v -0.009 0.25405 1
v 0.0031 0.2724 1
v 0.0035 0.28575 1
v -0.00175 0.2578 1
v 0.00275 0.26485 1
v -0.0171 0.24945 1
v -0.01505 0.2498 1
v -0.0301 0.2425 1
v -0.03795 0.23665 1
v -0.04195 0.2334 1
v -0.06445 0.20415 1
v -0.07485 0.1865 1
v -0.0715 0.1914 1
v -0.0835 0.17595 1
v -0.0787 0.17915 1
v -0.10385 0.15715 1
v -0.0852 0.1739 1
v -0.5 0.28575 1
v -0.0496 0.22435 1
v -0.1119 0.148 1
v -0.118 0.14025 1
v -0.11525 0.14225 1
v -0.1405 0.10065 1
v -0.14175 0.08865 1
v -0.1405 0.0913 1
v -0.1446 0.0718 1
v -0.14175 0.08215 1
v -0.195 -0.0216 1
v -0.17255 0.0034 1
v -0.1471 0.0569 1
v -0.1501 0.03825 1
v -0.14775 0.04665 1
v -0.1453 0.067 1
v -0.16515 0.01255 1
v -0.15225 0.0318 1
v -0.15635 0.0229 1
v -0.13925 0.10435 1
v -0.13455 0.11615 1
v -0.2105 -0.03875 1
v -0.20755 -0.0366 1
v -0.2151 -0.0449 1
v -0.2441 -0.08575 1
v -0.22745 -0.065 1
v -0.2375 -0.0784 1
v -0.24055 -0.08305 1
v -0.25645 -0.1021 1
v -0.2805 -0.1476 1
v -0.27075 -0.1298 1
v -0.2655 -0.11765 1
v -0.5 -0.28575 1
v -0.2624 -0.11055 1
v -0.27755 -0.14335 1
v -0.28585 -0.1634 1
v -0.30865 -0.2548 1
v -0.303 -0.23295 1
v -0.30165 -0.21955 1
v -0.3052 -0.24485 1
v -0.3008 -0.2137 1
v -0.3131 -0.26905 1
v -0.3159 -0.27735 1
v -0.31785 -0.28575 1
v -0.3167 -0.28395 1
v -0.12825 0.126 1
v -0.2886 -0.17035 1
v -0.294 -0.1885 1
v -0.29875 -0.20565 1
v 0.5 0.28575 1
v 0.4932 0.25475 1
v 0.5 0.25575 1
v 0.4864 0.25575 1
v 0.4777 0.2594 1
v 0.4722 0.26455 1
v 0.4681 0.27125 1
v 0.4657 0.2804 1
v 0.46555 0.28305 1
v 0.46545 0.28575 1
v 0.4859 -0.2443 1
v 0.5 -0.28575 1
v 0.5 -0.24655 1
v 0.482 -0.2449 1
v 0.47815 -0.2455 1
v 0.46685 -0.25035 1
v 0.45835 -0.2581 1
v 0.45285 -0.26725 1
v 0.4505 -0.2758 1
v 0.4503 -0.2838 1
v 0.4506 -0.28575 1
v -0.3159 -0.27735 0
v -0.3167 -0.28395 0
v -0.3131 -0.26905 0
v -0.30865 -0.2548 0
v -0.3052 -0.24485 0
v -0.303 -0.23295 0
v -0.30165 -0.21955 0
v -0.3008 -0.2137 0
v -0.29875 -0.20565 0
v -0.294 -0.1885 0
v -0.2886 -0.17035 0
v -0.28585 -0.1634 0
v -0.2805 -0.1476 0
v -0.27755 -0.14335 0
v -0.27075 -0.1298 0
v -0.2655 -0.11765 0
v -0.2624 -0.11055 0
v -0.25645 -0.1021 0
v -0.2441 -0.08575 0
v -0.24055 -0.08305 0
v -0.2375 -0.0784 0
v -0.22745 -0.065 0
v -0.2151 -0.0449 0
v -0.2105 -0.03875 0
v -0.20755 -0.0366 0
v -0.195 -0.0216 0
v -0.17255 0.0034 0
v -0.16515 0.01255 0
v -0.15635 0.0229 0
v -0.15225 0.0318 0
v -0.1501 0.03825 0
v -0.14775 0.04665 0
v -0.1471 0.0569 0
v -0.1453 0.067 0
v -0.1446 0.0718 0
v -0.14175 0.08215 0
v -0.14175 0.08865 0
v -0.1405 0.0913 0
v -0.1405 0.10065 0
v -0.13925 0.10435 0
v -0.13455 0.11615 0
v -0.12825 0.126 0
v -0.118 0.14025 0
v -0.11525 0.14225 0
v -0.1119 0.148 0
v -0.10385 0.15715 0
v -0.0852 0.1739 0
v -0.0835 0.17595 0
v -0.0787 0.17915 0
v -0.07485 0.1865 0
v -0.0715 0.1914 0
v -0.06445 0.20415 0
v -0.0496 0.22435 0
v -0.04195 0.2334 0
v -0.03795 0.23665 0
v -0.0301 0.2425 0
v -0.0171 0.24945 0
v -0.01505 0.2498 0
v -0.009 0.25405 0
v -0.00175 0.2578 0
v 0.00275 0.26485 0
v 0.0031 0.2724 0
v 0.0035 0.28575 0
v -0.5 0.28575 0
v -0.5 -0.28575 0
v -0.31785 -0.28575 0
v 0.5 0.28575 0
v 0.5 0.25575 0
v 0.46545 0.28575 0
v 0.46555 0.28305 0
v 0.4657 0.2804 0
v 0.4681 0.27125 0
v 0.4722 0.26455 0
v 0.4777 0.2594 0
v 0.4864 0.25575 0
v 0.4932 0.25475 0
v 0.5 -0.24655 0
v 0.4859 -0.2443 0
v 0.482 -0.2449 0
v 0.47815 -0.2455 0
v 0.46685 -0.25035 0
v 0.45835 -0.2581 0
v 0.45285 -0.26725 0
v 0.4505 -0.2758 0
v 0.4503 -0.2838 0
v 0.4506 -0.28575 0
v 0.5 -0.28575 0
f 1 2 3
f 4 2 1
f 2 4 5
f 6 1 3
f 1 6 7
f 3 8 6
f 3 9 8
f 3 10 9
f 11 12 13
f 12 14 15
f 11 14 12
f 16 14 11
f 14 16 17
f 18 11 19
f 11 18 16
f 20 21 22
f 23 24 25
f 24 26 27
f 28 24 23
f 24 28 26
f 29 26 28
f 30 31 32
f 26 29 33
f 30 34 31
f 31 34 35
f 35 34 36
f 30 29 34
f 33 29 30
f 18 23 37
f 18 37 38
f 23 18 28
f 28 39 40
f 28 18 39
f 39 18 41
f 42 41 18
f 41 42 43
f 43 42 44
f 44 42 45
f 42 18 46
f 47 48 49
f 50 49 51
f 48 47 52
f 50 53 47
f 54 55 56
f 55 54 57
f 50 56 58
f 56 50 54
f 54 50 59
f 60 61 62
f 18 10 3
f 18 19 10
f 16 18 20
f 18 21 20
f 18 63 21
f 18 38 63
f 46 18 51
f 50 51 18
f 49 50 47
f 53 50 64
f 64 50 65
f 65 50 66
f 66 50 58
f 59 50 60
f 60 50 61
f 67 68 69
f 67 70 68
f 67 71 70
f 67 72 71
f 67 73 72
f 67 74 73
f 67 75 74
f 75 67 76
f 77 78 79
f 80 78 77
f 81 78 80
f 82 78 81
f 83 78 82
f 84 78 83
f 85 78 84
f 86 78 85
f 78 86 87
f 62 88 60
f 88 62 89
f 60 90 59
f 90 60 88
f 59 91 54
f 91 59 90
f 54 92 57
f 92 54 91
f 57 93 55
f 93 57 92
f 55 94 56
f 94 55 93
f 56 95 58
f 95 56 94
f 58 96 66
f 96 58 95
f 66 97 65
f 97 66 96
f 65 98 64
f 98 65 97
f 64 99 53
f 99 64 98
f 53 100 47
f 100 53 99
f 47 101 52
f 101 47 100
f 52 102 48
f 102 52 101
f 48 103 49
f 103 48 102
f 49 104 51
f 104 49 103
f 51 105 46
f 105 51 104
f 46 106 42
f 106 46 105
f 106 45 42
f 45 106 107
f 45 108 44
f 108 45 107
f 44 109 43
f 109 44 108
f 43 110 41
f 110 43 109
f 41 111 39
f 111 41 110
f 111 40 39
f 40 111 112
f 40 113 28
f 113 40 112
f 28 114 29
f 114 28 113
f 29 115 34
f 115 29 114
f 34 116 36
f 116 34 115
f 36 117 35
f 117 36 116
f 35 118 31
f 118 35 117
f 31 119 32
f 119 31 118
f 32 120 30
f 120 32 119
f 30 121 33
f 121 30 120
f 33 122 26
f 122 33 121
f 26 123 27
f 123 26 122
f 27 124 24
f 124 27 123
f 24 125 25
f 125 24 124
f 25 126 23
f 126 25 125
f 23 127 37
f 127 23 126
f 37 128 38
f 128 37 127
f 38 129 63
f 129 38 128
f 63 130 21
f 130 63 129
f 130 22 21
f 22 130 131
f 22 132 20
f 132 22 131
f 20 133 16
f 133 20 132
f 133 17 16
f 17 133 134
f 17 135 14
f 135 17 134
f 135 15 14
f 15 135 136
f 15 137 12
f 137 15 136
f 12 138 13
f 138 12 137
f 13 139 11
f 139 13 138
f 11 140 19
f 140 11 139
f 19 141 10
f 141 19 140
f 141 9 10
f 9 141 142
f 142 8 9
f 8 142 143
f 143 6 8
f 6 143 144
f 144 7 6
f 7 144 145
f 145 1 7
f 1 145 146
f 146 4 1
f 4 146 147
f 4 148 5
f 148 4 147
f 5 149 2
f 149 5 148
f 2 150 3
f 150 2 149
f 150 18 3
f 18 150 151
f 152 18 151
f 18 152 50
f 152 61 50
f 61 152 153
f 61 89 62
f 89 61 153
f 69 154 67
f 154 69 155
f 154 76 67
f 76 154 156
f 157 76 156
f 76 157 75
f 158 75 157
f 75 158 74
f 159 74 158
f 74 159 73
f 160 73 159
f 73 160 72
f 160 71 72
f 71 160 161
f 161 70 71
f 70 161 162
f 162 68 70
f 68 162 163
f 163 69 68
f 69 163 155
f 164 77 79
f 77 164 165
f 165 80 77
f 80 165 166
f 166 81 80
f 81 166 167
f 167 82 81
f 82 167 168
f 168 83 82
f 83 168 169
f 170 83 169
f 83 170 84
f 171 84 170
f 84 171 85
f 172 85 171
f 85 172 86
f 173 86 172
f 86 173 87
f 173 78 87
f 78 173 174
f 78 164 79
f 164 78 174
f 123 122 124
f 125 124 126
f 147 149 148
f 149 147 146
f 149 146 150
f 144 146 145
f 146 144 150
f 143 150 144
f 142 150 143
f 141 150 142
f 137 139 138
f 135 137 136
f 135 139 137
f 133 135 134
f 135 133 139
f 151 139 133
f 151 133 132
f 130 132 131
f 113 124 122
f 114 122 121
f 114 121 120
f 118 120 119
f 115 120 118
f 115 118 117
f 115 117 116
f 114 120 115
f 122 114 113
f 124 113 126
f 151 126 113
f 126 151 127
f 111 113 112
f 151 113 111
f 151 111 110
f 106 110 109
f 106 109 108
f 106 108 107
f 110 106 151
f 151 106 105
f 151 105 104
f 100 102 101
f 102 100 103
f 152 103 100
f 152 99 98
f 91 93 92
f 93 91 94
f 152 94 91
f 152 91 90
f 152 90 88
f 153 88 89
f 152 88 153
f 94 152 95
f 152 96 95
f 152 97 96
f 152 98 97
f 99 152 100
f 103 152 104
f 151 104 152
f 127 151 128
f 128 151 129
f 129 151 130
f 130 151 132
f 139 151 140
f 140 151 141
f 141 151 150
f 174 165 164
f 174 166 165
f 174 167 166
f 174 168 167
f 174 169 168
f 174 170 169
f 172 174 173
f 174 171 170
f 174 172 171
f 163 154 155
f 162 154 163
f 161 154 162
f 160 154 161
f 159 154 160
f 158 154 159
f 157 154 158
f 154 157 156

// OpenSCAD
module card4yellow_1()
{
 /* Generated by trace2scad version 20150415
    http://aggregate.org/MAKE/TRACE2SCAD/
    Optimized model has 88/549 original points
 */
 color([0.5, 0.5, 0.5])
 assign(minx=0) /* polygon minx=0 */
 assign(miny=0) /* polygon miny=0 */
 assign(maxx=20000) /* polygon maxx=20000 */
 assign(maxy=11430) /* polygon maxy=11430 */
 assign(dx=maxx-minx)
 assign(dy=maxy-miny)
 assign(maxd=((dx>dy)?dx:dy))
 scale([1/maxd, 1/maxd, 1])
 translate([-minx-dx/2, -miny-dy/2, 0])
 linear_extrude(height=1, convexity=88)
 union() {
  union() {
   polygon([[0,5715],[0,0],[3643,0],[3666,36],[3682,168],[3738,334],[3827,619],[3896,818],[3940,1056],[3967,1324],[3984,1441],[4025,1602],[4120,1945],[4228,2308],[4283,2447],[4390,2763],[4449,2848],[4585,3119],[4690,3362],[4752,3504],[4871,3673],[5118,4000],[5189,4054],[5250,4147],[5451,4415],[5698,4817],[5790,4940],[5849,4983],[6100,5283],[6549,5783],[6697,5966],[6873,6173],[6955,6351],[6998,6480],[7045,6648],[7058,6853],[7094,7055],[7108,7151],[7165,7358],[7165,7488],[7190,7541],[7190,7728],[7215,7802],[7309,8038],[7435,8235],[7640,8520],[7695,8560],[7762,8675],[7923,8858],[8296,9193],[8330,9234],[8426,9298],[8503,9445],[8570,9543],[8711,9798],[9008,10202],[9161,10383],[9241,10448],[9398,10565],[9658,10704],[9699,10711],[9820,10796],[9965,10871],[10055,11012],[10062,11163],[10070,11430],[0,11430]], convexity=5);
   polygon([[19311,11376],[19314,11323],[19362,11140],[19444,11006],[19554,10903],[19728,10830],[19864,10810],[20000,10830],[20000,11430],[19309,11430]], convexity=5);
   polygon([[19640,817],[19563,805],[19337,708],[19167,553],[19057,370],[19010,199],[19006,39],[19012,0],[20000,0],[20000,784],[19718,829]], convexity=6);
  }
 }
}

module card4yellow()
{
 /* all layers combined, scaled to within a 1mm cube */
 scale([1, 1, 1/1])
 difference() {
  union() {
   scale([1,1,2]) translate([0,0,-0.5]) card4yellow_1();
  }
  translate([0,0,-2]) cube([2,2,4],center=true);
 }
}
card4yellow();
